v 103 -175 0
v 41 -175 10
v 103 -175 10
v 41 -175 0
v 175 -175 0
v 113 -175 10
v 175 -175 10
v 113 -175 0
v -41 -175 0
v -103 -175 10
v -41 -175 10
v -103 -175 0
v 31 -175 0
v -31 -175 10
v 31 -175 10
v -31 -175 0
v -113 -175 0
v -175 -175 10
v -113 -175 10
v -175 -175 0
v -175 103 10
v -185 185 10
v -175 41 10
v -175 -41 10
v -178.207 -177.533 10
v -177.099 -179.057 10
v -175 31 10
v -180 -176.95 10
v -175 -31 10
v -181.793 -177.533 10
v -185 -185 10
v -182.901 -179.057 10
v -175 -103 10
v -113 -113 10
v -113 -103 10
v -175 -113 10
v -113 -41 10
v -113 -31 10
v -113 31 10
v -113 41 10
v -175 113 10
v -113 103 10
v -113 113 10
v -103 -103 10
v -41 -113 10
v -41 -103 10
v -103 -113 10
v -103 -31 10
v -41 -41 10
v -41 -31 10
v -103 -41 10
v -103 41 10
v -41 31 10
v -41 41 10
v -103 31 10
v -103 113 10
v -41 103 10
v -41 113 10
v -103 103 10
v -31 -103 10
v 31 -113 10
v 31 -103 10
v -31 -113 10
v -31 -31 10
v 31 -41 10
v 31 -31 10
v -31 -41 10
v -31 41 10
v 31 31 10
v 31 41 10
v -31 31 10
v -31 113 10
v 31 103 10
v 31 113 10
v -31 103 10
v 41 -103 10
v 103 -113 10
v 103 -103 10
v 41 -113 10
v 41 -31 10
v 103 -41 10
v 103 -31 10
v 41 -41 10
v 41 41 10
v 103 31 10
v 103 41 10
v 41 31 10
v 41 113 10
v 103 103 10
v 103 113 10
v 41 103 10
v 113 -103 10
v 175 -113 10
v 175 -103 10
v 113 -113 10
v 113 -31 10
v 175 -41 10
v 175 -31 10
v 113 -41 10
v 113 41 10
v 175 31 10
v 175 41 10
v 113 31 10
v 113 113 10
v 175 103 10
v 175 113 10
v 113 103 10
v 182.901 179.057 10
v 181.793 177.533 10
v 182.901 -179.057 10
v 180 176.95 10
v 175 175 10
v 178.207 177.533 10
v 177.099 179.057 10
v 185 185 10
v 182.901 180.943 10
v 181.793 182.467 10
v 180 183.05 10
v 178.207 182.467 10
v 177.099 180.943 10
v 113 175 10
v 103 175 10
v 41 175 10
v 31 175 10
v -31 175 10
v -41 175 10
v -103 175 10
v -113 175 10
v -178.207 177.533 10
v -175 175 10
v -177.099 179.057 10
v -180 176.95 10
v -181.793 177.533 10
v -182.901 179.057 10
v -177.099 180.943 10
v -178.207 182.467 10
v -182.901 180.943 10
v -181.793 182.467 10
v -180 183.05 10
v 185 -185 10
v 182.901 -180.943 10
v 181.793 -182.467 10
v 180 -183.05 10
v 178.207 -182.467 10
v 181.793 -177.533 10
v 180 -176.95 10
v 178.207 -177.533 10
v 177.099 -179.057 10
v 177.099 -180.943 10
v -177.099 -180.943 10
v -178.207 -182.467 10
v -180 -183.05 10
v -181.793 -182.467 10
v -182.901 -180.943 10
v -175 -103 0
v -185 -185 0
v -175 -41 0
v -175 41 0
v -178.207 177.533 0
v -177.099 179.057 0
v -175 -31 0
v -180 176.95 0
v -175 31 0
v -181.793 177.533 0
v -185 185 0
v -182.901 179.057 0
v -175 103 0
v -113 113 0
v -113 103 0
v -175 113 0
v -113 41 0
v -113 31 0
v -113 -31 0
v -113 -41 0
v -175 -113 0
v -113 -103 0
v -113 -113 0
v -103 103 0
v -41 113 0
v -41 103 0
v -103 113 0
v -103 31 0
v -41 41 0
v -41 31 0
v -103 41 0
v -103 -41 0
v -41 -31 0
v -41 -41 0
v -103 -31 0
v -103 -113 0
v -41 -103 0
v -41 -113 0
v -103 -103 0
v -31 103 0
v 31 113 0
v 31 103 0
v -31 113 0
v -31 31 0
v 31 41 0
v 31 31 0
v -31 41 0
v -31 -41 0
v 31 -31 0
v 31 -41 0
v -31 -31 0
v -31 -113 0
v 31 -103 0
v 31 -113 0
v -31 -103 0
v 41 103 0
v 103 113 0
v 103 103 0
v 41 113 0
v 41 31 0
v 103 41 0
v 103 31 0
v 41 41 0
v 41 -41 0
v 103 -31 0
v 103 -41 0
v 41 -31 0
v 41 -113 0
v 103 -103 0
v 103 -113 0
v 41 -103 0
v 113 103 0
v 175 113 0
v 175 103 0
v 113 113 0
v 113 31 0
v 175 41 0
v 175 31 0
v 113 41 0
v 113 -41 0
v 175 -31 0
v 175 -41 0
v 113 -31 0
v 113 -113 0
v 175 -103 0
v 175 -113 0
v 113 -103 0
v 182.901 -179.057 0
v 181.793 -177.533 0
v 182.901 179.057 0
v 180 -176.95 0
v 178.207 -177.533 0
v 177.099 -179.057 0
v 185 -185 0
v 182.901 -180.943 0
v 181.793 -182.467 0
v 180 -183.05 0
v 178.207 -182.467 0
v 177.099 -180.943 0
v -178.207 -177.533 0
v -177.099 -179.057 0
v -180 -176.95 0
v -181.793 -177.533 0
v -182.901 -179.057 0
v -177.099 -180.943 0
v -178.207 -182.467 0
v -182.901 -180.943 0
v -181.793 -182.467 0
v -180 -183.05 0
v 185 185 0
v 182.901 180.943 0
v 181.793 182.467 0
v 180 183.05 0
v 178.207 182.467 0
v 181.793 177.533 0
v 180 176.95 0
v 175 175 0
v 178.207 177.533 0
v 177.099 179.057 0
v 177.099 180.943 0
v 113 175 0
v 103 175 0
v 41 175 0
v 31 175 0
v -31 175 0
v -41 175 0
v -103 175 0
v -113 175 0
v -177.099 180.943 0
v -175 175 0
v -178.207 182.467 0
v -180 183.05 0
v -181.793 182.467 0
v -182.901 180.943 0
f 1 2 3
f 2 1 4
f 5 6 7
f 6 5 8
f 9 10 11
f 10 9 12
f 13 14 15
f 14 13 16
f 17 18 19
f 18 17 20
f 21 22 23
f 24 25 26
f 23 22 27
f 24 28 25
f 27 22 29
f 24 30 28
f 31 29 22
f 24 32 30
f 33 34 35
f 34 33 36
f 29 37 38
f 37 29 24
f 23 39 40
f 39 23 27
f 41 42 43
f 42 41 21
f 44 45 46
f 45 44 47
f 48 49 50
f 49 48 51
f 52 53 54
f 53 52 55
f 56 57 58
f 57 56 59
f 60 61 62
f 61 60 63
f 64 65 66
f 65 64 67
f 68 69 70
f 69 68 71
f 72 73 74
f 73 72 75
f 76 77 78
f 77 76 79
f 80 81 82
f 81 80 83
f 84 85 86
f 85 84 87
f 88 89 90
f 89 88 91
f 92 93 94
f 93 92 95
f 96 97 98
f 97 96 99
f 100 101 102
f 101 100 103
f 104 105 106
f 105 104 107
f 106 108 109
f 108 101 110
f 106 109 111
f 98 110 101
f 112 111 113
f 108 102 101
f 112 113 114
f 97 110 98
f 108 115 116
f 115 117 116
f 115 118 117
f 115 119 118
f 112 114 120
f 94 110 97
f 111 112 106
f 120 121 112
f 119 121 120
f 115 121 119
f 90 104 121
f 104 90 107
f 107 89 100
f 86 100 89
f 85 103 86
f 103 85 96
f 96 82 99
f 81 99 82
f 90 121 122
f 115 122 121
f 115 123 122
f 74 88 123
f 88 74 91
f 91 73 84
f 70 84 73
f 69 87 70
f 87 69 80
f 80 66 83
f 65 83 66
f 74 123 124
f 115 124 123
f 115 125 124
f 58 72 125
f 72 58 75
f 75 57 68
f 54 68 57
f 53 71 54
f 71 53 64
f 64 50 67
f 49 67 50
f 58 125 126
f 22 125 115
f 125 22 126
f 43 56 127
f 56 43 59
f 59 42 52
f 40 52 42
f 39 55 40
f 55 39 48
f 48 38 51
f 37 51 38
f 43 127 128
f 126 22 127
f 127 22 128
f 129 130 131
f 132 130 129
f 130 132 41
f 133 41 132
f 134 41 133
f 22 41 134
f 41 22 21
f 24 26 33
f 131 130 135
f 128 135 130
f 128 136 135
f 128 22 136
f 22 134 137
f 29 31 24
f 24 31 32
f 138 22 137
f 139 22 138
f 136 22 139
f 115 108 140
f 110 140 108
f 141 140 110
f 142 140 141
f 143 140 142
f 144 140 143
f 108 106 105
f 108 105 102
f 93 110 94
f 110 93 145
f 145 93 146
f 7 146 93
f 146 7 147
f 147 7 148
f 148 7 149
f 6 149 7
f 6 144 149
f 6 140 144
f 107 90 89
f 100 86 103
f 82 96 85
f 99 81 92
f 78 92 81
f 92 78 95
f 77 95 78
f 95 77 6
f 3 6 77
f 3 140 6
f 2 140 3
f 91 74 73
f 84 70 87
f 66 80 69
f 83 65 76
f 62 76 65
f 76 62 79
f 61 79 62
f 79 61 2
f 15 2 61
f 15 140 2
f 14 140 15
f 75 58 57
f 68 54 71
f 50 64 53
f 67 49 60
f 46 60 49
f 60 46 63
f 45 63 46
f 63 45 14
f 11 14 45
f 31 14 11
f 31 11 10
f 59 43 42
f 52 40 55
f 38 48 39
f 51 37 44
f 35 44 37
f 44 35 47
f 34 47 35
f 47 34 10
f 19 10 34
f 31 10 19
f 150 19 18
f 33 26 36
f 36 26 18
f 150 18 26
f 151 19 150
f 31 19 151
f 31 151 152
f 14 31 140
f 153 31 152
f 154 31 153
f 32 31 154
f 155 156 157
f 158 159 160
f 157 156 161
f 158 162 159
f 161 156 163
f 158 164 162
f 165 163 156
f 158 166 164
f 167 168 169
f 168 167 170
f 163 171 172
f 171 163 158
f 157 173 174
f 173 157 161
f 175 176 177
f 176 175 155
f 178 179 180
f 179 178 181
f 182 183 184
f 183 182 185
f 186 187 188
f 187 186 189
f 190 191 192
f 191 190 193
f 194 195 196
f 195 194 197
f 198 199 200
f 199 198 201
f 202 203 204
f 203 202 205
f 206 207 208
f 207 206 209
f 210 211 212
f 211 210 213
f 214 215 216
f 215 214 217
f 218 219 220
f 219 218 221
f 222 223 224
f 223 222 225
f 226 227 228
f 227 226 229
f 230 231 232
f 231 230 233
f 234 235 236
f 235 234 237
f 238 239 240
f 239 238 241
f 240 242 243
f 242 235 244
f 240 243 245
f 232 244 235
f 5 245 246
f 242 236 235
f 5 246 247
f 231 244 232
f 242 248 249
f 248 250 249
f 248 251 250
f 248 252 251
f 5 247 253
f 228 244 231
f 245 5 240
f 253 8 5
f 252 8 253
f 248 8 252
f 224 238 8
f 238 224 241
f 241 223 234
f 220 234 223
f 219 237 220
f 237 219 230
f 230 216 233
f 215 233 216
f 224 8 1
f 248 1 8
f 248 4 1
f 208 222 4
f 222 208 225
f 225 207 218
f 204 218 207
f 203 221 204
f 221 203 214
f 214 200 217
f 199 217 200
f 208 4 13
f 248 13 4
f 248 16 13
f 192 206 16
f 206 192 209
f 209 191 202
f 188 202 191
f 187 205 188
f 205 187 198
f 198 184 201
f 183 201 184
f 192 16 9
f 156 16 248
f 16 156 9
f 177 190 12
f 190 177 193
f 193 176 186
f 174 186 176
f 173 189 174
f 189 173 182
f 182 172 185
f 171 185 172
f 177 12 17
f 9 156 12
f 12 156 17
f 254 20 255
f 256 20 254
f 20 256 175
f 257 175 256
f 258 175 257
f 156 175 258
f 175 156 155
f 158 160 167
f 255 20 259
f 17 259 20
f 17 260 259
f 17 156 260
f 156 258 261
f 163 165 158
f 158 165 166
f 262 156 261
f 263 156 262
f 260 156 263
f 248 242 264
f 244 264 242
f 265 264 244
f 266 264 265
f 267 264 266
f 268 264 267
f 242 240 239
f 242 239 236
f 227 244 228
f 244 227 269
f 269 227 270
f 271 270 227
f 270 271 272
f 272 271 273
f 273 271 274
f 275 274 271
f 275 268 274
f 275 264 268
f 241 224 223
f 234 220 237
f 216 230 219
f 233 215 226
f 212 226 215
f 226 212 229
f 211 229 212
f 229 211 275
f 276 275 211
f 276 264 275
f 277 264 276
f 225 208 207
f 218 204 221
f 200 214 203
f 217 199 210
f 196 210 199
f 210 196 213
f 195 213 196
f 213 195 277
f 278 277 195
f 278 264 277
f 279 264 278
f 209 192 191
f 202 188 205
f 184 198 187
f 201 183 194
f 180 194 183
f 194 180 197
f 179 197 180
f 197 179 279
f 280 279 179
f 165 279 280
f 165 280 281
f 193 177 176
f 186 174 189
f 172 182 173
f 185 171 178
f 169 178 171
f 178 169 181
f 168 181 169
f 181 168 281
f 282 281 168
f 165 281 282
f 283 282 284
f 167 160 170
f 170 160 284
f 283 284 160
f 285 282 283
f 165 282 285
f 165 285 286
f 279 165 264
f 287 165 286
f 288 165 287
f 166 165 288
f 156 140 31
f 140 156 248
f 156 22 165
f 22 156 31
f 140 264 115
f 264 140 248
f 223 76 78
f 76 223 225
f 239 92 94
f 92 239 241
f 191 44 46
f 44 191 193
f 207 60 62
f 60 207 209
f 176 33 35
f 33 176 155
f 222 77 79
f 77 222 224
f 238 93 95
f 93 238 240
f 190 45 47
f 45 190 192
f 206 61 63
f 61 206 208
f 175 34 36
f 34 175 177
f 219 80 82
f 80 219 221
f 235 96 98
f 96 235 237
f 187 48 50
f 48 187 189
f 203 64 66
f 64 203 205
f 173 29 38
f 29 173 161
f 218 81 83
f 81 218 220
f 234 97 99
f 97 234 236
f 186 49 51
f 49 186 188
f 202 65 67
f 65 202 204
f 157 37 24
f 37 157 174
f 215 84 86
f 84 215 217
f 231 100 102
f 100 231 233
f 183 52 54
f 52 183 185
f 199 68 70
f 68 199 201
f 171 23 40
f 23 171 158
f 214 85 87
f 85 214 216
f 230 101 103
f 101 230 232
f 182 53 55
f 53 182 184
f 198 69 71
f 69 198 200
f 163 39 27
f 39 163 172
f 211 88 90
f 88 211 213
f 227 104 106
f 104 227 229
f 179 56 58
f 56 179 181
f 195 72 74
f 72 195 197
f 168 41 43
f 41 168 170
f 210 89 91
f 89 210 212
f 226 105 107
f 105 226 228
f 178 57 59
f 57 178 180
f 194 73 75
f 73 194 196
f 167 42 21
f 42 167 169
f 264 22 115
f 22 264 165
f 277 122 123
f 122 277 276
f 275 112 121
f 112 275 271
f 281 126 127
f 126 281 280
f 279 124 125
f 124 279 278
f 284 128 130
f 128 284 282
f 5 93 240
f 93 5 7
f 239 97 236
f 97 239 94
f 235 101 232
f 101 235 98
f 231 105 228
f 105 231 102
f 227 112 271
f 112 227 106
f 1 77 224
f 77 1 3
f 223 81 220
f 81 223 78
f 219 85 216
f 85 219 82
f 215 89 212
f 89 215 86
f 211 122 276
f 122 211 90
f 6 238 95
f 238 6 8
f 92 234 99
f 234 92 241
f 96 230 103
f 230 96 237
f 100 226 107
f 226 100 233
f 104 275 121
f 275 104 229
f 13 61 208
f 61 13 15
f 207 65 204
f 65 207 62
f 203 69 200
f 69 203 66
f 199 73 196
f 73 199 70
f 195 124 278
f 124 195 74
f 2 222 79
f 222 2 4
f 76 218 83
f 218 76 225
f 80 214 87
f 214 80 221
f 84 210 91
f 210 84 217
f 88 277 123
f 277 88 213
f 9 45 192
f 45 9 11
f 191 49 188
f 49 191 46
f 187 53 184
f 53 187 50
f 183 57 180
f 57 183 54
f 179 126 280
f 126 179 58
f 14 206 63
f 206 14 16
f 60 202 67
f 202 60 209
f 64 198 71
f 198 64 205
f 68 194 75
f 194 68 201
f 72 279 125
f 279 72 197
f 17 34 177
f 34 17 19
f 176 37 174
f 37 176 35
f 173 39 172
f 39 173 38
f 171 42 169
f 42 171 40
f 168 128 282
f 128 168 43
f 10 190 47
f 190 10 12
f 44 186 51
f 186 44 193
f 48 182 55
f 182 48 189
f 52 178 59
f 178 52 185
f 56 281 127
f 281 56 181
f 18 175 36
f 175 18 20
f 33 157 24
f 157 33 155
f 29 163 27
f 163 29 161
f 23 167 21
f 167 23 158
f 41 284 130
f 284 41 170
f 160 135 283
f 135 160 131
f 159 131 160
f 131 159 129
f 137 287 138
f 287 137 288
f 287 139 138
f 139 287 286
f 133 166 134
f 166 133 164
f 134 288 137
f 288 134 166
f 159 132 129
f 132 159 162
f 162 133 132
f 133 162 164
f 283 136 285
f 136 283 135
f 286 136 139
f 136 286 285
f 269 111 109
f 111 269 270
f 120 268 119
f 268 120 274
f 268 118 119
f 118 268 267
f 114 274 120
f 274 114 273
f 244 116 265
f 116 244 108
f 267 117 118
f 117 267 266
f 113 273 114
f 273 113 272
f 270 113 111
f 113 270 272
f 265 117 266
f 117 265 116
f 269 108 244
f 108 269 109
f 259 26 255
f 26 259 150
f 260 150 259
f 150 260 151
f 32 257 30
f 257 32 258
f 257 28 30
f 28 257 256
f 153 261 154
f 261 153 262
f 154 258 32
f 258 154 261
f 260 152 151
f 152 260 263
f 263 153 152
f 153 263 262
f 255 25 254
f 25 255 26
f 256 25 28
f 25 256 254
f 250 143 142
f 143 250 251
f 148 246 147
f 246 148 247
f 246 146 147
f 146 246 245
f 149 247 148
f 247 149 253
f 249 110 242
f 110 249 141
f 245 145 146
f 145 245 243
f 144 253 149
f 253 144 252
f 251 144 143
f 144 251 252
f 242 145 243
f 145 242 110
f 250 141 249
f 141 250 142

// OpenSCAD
rotate([0, 0, 90]) translate([0, 0, 5]) difference()
{
  union()
  {
    for(x = [-370 / 2 + 5:72:220])
    {
      translate([x, 0, 0]) cube([10, 370, 10], center = true);
    }

    for(y = [-370 / 2 + 5:72:220])
    {
      translate([0, y, 0]) cube([370, 10, 10], center = true);
    }
  }

  // Bottom and top part are identical.
  for(x = [360 / 2, -360 / 2]) for(y = [360 / 2, -360 / 2])
  {
    translate([x, y, 0]) cylinder(h = 100, d = 6.1, center = true);
  }
}
